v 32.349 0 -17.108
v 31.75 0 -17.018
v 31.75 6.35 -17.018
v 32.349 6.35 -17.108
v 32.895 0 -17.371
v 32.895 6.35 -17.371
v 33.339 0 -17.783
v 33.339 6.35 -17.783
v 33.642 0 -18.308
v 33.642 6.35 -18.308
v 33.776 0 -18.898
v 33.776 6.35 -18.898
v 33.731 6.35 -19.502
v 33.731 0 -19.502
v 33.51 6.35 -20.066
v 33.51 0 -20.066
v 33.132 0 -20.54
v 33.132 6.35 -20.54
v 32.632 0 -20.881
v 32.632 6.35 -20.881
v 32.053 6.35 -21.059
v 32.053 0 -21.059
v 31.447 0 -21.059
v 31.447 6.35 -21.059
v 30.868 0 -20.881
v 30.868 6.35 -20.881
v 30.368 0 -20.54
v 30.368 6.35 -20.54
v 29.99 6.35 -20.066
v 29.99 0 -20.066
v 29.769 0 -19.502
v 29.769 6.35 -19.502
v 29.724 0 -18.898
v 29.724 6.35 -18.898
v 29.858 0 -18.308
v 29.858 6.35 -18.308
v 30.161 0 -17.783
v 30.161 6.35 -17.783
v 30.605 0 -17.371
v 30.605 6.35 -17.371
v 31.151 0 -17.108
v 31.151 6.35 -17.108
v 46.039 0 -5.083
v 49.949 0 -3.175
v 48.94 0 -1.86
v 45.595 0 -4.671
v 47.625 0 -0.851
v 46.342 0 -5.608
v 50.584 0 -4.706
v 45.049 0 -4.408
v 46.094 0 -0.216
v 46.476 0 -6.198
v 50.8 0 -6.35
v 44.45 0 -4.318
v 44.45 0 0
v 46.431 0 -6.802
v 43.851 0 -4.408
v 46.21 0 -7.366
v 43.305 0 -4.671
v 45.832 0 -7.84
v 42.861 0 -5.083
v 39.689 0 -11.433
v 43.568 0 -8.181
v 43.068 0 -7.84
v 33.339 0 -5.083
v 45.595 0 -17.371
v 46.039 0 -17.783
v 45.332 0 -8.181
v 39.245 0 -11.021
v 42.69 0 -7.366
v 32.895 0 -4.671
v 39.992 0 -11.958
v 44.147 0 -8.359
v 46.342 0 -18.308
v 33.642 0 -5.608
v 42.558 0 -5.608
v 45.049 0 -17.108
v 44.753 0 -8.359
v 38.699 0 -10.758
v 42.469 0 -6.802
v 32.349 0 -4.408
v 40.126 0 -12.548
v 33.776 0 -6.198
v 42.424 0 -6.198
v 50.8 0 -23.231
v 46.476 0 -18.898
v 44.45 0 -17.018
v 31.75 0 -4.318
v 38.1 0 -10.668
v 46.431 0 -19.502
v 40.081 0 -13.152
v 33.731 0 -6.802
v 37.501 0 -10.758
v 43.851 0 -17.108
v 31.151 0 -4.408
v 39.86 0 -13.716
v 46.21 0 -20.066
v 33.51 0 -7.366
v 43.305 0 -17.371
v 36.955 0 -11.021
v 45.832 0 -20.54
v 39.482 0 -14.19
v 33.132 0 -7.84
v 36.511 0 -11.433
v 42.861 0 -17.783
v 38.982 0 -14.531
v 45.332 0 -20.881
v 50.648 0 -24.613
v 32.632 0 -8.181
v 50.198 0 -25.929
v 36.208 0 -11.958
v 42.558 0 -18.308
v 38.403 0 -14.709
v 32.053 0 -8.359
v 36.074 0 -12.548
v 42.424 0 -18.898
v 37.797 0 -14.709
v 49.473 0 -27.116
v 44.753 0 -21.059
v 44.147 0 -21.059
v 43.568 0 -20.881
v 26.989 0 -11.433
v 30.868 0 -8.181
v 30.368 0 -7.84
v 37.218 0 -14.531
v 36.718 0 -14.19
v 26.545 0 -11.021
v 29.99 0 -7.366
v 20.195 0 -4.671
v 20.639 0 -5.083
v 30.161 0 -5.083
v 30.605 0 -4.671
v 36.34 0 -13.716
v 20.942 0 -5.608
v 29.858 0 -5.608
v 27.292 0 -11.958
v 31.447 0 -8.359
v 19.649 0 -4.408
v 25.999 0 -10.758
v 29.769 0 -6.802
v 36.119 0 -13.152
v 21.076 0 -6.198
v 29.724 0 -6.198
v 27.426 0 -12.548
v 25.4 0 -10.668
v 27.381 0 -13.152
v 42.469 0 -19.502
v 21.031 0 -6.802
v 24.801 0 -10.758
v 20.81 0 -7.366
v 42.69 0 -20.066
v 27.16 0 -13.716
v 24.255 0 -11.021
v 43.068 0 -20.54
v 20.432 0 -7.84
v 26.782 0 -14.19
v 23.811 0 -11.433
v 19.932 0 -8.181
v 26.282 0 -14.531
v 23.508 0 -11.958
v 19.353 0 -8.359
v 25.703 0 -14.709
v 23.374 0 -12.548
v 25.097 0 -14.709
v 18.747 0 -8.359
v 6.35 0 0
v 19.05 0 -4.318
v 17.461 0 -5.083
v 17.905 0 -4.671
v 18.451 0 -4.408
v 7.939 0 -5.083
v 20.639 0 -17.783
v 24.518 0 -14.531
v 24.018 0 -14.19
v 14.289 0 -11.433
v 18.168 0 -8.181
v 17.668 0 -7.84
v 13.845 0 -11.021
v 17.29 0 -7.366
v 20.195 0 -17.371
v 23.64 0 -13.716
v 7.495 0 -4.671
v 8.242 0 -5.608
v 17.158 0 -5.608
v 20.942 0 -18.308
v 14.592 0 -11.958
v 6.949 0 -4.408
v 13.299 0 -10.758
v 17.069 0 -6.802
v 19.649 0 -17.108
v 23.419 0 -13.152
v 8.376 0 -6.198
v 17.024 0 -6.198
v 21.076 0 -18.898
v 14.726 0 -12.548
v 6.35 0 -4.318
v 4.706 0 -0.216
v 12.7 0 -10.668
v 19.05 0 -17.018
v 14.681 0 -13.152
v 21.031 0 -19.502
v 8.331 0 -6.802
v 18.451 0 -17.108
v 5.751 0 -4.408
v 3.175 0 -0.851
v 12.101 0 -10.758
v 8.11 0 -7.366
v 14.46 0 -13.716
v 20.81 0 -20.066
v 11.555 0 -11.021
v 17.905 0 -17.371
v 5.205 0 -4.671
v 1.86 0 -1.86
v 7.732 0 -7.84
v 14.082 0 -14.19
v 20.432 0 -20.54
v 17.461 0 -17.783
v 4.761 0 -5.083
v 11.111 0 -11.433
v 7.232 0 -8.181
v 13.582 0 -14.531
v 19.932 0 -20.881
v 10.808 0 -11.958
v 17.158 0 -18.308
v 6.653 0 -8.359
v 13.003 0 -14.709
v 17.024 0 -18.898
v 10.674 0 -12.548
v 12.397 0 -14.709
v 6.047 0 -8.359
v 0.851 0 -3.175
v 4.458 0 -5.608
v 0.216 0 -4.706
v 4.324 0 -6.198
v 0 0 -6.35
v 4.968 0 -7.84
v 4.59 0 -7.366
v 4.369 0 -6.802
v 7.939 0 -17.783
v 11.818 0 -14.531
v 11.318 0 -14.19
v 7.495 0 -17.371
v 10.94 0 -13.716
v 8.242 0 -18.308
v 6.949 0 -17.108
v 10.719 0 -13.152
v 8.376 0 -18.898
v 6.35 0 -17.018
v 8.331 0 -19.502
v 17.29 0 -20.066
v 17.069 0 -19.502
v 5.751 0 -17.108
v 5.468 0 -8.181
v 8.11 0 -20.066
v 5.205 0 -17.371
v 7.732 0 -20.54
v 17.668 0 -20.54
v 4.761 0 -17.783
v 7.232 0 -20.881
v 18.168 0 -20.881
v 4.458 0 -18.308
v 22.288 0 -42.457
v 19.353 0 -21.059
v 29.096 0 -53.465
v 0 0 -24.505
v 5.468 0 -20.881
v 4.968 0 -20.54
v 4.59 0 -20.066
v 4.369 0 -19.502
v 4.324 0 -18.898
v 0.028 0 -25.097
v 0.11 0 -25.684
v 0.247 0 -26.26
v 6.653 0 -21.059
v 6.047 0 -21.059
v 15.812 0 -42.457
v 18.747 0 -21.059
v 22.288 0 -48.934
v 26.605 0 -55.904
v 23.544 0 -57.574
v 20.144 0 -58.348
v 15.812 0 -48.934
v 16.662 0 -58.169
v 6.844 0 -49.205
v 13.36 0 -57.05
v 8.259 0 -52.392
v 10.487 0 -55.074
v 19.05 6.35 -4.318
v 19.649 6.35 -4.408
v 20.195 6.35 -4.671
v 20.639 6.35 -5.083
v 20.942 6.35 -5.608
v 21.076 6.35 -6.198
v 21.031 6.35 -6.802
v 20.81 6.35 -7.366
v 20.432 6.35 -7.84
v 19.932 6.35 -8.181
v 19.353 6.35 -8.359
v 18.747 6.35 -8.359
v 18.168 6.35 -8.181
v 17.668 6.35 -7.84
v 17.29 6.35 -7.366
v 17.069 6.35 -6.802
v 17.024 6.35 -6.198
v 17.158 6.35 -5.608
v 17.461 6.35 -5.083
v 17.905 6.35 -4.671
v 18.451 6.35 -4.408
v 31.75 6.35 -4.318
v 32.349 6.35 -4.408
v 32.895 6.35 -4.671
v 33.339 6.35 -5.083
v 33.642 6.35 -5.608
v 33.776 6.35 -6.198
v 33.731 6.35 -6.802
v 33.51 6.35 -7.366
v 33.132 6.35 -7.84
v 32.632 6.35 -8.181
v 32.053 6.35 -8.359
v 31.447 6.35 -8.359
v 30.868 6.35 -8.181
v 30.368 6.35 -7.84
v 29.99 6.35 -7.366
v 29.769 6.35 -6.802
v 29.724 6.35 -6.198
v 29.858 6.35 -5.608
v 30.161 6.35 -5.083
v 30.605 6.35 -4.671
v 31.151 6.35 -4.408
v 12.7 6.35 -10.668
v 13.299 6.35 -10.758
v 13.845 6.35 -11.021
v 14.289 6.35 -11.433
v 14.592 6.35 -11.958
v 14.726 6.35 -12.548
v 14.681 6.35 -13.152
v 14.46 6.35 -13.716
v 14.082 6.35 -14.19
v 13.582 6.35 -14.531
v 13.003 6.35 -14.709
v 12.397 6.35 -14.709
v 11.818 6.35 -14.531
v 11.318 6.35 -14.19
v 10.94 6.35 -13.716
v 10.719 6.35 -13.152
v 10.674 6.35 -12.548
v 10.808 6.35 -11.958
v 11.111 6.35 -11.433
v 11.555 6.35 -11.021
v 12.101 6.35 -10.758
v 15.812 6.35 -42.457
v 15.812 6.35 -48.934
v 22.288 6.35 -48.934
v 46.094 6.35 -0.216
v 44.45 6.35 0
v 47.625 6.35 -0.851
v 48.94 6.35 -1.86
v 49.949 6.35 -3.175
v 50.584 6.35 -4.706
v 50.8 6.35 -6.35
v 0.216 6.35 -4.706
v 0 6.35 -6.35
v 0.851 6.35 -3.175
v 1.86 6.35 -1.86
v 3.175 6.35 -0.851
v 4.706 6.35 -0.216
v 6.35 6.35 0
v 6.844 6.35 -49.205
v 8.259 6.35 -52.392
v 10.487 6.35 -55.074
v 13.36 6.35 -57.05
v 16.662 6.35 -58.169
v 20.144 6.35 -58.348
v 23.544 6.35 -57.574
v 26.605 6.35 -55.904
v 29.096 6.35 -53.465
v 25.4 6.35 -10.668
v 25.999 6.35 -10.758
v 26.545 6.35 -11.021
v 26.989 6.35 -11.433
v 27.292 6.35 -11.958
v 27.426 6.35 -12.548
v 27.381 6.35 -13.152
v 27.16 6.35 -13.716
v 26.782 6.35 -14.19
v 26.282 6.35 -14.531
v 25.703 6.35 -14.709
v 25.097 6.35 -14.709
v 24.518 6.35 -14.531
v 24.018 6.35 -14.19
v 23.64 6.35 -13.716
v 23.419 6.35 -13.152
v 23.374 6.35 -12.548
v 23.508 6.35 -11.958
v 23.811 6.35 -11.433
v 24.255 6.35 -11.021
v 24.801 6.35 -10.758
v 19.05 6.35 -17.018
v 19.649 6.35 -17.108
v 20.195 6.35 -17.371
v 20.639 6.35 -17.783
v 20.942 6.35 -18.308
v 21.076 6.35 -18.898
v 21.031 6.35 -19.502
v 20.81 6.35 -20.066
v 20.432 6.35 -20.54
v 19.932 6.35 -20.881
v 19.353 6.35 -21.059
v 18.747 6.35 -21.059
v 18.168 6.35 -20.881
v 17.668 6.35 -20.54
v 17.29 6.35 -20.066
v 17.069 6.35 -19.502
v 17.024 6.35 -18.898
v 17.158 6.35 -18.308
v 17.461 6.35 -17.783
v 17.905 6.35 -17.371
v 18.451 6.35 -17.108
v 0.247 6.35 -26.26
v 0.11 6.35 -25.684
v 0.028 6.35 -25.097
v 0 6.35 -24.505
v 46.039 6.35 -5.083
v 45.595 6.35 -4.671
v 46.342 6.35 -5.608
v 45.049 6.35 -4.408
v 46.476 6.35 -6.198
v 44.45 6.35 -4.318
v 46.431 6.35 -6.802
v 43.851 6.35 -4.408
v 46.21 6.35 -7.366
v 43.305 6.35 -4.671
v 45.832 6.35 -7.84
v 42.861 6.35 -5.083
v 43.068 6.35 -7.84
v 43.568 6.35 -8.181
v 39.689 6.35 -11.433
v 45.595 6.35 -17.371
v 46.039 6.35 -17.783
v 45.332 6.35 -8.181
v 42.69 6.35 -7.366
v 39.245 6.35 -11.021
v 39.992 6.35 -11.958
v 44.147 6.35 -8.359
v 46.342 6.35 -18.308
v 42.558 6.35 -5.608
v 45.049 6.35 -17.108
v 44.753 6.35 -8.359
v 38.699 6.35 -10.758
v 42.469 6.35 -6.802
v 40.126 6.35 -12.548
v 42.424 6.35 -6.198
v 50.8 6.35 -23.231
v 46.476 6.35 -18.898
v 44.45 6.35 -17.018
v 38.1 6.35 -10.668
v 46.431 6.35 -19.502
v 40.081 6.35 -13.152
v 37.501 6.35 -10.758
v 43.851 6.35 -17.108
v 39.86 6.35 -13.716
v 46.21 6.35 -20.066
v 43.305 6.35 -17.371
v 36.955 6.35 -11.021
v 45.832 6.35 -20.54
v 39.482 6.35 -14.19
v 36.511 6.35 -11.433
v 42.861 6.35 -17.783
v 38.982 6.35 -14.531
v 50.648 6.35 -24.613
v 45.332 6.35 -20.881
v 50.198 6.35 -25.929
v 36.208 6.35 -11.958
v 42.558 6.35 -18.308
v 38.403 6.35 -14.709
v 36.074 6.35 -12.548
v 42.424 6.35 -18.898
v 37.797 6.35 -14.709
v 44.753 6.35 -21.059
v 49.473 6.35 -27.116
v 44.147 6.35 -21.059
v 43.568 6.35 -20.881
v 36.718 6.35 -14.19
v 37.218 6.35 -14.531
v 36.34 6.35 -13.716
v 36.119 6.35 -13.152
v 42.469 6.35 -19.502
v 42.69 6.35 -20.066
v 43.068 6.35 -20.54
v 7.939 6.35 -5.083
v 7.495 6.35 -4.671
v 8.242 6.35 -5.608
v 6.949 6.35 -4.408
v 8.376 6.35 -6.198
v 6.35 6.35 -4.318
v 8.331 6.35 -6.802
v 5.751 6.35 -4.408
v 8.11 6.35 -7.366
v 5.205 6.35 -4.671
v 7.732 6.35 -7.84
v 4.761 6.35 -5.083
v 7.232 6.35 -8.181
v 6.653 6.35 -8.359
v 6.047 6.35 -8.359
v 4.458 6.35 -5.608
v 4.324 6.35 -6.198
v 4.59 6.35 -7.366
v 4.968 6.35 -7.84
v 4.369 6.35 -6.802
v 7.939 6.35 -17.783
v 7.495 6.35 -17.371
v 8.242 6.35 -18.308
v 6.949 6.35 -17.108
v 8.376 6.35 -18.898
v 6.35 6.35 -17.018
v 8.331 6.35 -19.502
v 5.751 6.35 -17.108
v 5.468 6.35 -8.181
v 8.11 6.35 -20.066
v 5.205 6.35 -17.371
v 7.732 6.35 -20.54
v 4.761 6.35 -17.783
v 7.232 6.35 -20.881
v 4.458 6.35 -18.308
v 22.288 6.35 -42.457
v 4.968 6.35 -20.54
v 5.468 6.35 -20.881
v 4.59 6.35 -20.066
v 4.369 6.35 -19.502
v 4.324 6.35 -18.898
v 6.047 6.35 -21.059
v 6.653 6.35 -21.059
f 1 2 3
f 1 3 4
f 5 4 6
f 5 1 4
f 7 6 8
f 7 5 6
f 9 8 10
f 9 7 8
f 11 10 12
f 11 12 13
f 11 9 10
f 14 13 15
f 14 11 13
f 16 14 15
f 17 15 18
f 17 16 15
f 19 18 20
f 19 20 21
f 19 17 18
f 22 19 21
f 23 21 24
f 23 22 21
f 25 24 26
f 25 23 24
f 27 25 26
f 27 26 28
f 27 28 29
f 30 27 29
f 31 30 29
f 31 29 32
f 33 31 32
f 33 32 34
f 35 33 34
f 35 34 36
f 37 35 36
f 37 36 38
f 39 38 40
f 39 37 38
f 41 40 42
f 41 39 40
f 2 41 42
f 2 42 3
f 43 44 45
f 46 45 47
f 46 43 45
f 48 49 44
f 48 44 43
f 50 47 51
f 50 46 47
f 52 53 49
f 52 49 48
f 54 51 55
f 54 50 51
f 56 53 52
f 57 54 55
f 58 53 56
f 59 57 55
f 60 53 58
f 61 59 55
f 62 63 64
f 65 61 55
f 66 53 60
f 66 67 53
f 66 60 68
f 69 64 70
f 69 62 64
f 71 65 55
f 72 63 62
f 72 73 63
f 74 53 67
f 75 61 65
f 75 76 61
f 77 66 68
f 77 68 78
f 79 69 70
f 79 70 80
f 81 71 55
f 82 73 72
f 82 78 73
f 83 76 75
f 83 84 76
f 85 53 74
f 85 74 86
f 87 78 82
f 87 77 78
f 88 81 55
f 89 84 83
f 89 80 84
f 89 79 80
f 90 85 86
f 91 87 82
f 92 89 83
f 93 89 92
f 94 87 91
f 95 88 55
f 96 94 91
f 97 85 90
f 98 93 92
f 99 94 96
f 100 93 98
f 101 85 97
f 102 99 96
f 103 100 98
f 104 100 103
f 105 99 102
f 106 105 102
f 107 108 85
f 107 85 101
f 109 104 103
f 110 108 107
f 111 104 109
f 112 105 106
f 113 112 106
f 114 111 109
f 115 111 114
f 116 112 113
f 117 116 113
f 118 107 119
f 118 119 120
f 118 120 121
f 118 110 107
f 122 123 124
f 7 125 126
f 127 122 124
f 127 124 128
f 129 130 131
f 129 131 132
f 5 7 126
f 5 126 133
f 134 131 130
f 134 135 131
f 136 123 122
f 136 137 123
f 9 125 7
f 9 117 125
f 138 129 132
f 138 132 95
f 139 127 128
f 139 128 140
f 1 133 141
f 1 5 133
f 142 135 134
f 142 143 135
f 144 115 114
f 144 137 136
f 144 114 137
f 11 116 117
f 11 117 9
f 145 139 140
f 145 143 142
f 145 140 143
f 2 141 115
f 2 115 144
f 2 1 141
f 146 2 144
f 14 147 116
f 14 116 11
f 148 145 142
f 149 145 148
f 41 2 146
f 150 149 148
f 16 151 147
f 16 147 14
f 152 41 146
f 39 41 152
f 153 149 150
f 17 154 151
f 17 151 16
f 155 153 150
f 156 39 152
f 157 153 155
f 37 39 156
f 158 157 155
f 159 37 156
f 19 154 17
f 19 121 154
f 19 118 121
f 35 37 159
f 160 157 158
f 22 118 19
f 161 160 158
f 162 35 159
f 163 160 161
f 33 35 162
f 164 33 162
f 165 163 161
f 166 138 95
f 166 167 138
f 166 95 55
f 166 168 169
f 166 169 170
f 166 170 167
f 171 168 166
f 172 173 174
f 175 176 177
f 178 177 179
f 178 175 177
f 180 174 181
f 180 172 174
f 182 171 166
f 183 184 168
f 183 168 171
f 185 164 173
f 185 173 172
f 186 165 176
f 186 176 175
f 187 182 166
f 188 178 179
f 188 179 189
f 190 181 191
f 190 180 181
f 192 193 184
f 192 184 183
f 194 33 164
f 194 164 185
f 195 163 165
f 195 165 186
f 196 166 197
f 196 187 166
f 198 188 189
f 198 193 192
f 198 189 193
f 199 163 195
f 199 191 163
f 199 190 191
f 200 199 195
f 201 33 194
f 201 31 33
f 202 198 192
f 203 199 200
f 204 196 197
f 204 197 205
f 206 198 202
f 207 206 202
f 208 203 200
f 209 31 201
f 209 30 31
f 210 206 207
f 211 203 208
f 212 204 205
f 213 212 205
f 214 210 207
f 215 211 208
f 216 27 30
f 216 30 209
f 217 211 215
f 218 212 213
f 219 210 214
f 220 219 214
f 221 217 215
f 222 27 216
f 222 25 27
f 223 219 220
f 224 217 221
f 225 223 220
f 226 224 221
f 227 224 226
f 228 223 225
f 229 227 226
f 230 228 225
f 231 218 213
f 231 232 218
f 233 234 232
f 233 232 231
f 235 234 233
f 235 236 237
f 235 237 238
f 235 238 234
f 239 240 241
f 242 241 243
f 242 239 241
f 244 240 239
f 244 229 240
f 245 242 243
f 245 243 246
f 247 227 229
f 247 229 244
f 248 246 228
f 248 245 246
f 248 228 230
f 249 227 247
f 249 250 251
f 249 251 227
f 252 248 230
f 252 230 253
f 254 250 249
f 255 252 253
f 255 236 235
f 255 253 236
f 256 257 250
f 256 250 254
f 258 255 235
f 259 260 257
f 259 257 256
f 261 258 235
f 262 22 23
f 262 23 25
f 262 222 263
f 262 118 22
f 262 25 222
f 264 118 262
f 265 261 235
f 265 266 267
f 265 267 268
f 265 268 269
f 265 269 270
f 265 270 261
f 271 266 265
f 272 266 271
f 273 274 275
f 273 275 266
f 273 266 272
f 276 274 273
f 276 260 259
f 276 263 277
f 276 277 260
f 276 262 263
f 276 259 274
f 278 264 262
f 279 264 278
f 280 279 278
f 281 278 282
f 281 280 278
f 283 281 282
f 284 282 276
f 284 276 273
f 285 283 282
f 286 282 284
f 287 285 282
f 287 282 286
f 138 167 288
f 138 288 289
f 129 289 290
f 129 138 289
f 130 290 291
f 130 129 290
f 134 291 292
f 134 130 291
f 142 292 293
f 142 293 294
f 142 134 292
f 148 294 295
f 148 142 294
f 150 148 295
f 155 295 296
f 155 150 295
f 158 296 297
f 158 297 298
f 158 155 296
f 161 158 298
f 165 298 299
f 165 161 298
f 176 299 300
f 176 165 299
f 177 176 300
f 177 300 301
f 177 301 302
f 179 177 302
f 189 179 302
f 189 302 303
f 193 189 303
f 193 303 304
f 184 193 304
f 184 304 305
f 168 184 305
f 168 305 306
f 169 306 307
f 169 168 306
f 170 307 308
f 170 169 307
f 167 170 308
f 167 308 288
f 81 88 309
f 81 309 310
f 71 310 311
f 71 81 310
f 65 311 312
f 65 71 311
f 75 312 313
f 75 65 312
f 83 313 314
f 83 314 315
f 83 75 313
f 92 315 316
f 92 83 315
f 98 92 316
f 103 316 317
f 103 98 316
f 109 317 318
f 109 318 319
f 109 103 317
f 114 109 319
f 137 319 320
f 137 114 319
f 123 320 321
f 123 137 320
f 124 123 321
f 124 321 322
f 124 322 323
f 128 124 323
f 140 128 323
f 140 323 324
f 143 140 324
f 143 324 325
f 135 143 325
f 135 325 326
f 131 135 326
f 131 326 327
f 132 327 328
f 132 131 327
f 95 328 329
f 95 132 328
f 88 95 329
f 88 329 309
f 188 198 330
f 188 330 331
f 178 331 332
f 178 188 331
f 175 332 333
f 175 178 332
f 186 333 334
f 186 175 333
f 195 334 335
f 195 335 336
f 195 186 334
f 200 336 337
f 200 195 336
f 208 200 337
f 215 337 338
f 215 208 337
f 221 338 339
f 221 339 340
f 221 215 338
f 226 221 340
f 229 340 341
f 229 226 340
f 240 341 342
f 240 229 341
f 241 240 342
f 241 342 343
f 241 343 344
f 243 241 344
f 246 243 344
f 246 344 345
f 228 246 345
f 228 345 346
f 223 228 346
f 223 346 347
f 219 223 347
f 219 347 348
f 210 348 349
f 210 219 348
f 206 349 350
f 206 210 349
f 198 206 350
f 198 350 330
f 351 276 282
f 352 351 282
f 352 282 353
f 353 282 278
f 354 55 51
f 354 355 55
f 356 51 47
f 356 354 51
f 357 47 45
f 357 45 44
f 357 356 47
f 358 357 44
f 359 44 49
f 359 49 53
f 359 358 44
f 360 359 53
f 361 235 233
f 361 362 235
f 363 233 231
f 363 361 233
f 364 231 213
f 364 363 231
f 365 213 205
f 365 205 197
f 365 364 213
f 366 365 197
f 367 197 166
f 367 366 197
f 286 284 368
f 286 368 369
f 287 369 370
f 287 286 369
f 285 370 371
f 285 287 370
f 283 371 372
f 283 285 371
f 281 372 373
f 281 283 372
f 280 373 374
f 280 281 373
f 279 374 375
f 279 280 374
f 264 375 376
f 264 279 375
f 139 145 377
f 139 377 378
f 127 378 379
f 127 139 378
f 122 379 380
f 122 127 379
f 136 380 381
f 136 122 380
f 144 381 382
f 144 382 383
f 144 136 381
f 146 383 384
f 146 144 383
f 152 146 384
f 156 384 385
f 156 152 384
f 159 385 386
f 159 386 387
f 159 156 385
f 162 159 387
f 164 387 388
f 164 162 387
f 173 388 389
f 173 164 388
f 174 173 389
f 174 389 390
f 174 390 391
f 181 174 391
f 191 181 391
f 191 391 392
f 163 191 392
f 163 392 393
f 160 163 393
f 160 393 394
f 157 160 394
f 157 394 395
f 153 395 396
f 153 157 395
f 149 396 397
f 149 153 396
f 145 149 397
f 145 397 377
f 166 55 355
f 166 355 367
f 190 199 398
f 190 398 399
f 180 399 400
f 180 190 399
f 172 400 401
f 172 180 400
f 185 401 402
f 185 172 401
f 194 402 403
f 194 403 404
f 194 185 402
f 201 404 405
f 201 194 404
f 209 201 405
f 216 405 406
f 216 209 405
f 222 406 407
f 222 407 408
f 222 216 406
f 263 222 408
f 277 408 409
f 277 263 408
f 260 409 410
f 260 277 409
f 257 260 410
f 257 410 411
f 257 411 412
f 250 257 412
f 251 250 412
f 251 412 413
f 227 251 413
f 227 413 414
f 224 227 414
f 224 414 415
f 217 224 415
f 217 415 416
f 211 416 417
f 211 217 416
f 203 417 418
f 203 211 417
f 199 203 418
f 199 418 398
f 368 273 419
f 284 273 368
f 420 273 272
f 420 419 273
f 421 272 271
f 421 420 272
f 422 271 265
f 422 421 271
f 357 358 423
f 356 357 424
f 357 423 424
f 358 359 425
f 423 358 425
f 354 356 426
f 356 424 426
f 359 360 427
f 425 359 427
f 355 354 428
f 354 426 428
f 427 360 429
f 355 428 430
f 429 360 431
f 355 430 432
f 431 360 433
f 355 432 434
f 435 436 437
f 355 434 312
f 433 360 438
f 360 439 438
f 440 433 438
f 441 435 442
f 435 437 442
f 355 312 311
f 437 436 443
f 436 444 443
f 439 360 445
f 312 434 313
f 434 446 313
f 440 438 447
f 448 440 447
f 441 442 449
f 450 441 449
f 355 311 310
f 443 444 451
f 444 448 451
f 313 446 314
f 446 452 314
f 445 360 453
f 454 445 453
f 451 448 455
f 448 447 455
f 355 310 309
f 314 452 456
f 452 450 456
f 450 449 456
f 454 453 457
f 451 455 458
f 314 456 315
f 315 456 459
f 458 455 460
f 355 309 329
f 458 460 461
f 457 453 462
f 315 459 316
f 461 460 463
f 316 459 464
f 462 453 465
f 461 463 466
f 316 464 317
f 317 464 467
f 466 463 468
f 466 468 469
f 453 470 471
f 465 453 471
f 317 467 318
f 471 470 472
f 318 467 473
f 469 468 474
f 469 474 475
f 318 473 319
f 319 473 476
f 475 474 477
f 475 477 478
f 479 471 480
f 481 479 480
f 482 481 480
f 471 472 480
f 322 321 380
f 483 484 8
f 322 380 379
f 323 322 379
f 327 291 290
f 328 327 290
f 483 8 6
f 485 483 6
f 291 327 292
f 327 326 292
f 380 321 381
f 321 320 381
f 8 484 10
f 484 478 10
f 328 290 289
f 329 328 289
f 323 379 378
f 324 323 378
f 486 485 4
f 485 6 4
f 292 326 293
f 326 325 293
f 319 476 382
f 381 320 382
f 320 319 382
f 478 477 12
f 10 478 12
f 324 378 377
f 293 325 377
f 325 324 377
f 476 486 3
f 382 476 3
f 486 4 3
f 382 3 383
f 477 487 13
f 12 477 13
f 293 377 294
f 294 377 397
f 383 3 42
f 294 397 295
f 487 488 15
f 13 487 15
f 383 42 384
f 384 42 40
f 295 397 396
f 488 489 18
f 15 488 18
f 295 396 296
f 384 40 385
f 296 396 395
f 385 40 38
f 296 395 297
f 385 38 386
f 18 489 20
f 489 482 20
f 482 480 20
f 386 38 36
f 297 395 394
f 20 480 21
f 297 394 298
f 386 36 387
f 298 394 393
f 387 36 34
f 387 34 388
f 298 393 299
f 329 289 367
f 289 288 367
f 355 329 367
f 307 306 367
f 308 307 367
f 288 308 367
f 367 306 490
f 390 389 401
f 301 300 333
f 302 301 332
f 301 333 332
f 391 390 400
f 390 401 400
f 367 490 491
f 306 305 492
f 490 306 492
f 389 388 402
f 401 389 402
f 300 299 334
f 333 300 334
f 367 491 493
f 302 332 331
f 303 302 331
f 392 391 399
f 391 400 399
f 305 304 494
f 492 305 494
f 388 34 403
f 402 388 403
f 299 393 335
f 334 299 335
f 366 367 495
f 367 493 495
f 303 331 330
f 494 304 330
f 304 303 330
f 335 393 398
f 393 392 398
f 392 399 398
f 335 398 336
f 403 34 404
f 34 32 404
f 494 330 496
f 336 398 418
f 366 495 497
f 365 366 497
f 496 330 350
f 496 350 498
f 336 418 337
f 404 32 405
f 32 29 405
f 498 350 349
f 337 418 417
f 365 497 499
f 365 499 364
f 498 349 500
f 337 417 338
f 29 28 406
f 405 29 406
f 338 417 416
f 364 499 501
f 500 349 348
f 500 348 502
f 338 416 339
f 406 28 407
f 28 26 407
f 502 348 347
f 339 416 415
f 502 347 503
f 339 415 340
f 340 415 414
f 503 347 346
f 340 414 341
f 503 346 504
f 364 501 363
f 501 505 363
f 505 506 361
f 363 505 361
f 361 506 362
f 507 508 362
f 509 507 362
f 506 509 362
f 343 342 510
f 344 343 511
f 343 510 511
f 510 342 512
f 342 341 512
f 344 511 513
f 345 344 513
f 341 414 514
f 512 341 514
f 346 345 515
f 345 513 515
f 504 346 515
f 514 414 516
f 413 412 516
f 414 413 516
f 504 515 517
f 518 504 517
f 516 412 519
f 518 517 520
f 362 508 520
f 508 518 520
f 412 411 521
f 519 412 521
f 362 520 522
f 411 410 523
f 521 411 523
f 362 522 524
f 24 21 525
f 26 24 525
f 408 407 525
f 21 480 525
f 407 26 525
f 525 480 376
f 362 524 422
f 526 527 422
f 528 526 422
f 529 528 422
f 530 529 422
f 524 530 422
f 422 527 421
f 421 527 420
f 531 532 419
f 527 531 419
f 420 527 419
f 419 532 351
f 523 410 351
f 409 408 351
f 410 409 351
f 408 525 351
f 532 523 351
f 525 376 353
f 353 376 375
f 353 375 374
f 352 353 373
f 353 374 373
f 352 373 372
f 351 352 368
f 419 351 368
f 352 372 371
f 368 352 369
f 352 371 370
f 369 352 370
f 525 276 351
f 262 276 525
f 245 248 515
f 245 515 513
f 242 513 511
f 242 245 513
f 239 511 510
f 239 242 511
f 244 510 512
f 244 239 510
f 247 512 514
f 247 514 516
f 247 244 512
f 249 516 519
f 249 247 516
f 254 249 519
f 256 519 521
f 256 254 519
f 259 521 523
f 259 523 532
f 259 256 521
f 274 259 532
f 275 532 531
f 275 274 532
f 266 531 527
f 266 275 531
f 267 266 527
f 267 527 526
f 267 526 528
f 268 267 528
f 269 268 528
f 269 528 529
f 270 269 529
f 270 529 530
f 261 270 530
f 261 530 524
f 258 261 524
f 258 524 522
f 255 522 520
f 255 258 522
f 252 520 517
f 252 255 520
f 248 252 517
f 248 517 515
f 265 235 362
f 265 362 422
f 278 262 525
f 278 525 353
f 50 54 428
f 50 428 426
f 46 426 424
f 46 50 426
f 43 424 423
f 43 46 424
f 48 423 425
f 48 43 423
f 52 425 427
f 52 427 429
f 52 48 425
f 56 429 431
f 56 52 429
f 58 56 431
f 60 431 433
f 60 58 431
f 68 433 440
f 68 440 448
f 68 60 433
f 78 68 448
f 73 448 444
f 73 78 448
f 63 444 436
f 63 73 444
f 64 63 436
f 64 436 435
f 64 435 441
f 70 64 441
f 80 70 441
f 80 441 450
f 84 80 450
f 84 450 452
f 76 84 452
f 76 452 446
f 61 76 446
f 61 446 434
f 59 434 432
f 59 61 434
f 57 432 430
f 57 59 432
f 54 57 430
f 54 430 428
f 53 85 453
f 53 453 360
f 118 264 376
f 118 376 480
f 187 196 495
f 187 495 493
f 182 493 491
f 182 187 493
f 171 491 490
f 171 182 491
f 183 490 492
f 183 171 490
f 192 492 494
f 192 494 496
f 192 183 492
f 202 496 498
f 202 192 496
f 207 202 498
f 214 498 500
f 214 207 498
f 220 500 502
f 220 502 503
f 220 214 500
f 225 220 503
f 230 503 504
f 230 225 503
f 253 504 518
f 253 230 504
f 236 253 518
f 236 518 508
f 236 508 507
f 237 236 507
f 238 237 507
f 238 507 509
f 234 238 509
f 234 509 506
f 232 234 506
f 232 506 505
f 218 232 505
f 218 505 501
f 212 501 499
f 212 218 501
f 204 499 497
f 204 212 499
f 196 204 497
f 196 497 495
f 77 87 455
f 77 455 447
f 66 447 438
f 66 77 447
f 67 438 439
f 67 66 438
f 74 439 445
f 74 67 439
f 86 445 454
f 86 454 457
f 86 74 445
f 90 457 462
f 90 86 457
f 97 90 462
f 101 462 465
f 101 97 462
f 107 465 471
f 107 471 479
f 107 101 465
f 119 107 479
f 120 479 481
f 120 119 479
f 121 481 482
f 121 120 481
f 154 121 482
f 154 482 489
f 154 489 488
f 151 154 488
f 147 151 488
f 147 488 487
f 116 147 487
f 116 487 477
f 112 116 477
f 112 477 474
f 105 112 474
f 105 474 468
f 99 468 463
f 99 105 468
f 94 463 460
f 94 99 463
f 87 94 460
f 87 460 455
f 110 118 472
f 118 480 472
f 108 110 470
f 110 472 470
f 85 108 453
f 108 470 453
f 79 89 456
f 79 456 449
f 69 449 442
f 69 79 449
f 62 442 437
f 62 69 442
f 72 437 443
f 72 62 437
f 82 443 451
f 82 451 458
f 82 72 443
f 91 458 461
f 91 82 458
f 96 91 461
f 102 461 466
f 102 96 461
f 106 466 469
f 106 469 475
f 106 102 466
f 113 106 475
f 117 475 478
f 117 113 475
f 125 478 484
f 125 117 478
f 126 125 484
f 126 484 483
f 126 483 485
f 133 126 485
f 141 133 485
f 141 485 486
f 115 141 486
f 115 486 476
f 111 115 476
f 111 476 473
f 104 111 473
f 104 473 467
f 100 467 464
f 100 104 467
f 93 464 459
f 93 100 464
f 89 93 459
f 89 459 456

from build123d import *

# Parameters (mm, degrees)
SKETCH1_R           = 2.032
SKETCH1_W           = 6.477
SKETCH1_H           = 6.477
BOSS_EXTRUDE1_DEPTH = 6.35
FILLET1_R           = 6.35


with BuildPart() as part:
    # Sketch1 → Boss-Extrude1 (new body)
    with BuildSketch(Plane(origin=(0, 0, 0), x_dir=(1, 0, 0), z_dir=(0, 1, 0))):
        with BuildLine():
            Line((0, 25.4), (6.844498349, 49.204945244))
            ThreePointArc((6.844498349, 49.204945244), (16.662090732, 58.169055341), (29.096336444, 53.464810065))
            Line((29.096336444, 53.464810065), (50.8, 25.4))
            Line((50.8, 25.4), (50.8, 0))
            Line((50.8, 0), (0, 0))
            Line((0, 0), (0, 25.4))
        make_face()
        with Locations(Location((6.35, 6.35, 0), (0, 0, 270))):
            Circle(SKETCH1_R, mode=Mode.SUBTRACT)
        with Locations(Location((19.05, 6.35, 0), (0, 0, 270))):
            Circle(SKETCH1_R, mode=Mode.SUBTRACT)
        with Locations(Location((31.75, 6.35, 0), (0, 0, 270))):
            Circle(SKETCH1_R, mode=Mode.SUBTRACT)
        with Locations(Location((44.45, 6.35, 0), (0, 0, 270))):
            Circle(SKETCH1_R, mode=Mode.SUBTRACT)
        with Locations(Location((19.05, 19.05, 0), (0, 0, 270))):
            Circle(SKETCH1_R, mode=Mode.SUBTRACT)
        with Locations(Location((31.75, 19.05, 0), (0, 0, 270))):
            Circle(SKETCH1_R, mode=Mode.SUBTRACT)
        with Locations(Location((44.45, 19.05, 0), (0, 0, 270))):
            Circle(SKETCH1_R, mode=Mode.SUBTRACT)
        with Locations(Location((6.35, 19.05, 0), (0, 0, 270))):
            Circle(SKETCH1_R, mode=Mode.SUBTRACT)
        with Locations(Location((12.7, 12.7, 0), (0, 0, 270))):
            Circle(SKETCH1_R, mode=Mode.SUBTRACT)
        with Locations(Location((25.4, 12.7, 0), (0, 0, 270))):
            Circle(SKETCH1_R, mode=Mode.SUBTRACT)
        with Locations(Location((38.1, 12.7, 0), (0, 0, 270))):
            Circle(SKETCH1_R, mode=Mode.SUBTRACT)
        with Locations((19.05, 45.695567884)):
            Rectangle(SKETCH1_W, SKETCH1_H, mode=Mode.SUBTRACT)
    extrude(amount=BOSS_EXTRUDE1_DEPTH)

    # Fillet1
    fillet1_edges = [part.edges().sort_by_distance(p)[0] for p in [
        (0, 3.175, -25.4),
        (50.8, 3.175, -25.4),
        (50.8, 3.175, 0),
        (0, 3.175, 0),
    ]]
    fillet(fillet1_edges, radius=FILLET1_R)


solid = part.part
